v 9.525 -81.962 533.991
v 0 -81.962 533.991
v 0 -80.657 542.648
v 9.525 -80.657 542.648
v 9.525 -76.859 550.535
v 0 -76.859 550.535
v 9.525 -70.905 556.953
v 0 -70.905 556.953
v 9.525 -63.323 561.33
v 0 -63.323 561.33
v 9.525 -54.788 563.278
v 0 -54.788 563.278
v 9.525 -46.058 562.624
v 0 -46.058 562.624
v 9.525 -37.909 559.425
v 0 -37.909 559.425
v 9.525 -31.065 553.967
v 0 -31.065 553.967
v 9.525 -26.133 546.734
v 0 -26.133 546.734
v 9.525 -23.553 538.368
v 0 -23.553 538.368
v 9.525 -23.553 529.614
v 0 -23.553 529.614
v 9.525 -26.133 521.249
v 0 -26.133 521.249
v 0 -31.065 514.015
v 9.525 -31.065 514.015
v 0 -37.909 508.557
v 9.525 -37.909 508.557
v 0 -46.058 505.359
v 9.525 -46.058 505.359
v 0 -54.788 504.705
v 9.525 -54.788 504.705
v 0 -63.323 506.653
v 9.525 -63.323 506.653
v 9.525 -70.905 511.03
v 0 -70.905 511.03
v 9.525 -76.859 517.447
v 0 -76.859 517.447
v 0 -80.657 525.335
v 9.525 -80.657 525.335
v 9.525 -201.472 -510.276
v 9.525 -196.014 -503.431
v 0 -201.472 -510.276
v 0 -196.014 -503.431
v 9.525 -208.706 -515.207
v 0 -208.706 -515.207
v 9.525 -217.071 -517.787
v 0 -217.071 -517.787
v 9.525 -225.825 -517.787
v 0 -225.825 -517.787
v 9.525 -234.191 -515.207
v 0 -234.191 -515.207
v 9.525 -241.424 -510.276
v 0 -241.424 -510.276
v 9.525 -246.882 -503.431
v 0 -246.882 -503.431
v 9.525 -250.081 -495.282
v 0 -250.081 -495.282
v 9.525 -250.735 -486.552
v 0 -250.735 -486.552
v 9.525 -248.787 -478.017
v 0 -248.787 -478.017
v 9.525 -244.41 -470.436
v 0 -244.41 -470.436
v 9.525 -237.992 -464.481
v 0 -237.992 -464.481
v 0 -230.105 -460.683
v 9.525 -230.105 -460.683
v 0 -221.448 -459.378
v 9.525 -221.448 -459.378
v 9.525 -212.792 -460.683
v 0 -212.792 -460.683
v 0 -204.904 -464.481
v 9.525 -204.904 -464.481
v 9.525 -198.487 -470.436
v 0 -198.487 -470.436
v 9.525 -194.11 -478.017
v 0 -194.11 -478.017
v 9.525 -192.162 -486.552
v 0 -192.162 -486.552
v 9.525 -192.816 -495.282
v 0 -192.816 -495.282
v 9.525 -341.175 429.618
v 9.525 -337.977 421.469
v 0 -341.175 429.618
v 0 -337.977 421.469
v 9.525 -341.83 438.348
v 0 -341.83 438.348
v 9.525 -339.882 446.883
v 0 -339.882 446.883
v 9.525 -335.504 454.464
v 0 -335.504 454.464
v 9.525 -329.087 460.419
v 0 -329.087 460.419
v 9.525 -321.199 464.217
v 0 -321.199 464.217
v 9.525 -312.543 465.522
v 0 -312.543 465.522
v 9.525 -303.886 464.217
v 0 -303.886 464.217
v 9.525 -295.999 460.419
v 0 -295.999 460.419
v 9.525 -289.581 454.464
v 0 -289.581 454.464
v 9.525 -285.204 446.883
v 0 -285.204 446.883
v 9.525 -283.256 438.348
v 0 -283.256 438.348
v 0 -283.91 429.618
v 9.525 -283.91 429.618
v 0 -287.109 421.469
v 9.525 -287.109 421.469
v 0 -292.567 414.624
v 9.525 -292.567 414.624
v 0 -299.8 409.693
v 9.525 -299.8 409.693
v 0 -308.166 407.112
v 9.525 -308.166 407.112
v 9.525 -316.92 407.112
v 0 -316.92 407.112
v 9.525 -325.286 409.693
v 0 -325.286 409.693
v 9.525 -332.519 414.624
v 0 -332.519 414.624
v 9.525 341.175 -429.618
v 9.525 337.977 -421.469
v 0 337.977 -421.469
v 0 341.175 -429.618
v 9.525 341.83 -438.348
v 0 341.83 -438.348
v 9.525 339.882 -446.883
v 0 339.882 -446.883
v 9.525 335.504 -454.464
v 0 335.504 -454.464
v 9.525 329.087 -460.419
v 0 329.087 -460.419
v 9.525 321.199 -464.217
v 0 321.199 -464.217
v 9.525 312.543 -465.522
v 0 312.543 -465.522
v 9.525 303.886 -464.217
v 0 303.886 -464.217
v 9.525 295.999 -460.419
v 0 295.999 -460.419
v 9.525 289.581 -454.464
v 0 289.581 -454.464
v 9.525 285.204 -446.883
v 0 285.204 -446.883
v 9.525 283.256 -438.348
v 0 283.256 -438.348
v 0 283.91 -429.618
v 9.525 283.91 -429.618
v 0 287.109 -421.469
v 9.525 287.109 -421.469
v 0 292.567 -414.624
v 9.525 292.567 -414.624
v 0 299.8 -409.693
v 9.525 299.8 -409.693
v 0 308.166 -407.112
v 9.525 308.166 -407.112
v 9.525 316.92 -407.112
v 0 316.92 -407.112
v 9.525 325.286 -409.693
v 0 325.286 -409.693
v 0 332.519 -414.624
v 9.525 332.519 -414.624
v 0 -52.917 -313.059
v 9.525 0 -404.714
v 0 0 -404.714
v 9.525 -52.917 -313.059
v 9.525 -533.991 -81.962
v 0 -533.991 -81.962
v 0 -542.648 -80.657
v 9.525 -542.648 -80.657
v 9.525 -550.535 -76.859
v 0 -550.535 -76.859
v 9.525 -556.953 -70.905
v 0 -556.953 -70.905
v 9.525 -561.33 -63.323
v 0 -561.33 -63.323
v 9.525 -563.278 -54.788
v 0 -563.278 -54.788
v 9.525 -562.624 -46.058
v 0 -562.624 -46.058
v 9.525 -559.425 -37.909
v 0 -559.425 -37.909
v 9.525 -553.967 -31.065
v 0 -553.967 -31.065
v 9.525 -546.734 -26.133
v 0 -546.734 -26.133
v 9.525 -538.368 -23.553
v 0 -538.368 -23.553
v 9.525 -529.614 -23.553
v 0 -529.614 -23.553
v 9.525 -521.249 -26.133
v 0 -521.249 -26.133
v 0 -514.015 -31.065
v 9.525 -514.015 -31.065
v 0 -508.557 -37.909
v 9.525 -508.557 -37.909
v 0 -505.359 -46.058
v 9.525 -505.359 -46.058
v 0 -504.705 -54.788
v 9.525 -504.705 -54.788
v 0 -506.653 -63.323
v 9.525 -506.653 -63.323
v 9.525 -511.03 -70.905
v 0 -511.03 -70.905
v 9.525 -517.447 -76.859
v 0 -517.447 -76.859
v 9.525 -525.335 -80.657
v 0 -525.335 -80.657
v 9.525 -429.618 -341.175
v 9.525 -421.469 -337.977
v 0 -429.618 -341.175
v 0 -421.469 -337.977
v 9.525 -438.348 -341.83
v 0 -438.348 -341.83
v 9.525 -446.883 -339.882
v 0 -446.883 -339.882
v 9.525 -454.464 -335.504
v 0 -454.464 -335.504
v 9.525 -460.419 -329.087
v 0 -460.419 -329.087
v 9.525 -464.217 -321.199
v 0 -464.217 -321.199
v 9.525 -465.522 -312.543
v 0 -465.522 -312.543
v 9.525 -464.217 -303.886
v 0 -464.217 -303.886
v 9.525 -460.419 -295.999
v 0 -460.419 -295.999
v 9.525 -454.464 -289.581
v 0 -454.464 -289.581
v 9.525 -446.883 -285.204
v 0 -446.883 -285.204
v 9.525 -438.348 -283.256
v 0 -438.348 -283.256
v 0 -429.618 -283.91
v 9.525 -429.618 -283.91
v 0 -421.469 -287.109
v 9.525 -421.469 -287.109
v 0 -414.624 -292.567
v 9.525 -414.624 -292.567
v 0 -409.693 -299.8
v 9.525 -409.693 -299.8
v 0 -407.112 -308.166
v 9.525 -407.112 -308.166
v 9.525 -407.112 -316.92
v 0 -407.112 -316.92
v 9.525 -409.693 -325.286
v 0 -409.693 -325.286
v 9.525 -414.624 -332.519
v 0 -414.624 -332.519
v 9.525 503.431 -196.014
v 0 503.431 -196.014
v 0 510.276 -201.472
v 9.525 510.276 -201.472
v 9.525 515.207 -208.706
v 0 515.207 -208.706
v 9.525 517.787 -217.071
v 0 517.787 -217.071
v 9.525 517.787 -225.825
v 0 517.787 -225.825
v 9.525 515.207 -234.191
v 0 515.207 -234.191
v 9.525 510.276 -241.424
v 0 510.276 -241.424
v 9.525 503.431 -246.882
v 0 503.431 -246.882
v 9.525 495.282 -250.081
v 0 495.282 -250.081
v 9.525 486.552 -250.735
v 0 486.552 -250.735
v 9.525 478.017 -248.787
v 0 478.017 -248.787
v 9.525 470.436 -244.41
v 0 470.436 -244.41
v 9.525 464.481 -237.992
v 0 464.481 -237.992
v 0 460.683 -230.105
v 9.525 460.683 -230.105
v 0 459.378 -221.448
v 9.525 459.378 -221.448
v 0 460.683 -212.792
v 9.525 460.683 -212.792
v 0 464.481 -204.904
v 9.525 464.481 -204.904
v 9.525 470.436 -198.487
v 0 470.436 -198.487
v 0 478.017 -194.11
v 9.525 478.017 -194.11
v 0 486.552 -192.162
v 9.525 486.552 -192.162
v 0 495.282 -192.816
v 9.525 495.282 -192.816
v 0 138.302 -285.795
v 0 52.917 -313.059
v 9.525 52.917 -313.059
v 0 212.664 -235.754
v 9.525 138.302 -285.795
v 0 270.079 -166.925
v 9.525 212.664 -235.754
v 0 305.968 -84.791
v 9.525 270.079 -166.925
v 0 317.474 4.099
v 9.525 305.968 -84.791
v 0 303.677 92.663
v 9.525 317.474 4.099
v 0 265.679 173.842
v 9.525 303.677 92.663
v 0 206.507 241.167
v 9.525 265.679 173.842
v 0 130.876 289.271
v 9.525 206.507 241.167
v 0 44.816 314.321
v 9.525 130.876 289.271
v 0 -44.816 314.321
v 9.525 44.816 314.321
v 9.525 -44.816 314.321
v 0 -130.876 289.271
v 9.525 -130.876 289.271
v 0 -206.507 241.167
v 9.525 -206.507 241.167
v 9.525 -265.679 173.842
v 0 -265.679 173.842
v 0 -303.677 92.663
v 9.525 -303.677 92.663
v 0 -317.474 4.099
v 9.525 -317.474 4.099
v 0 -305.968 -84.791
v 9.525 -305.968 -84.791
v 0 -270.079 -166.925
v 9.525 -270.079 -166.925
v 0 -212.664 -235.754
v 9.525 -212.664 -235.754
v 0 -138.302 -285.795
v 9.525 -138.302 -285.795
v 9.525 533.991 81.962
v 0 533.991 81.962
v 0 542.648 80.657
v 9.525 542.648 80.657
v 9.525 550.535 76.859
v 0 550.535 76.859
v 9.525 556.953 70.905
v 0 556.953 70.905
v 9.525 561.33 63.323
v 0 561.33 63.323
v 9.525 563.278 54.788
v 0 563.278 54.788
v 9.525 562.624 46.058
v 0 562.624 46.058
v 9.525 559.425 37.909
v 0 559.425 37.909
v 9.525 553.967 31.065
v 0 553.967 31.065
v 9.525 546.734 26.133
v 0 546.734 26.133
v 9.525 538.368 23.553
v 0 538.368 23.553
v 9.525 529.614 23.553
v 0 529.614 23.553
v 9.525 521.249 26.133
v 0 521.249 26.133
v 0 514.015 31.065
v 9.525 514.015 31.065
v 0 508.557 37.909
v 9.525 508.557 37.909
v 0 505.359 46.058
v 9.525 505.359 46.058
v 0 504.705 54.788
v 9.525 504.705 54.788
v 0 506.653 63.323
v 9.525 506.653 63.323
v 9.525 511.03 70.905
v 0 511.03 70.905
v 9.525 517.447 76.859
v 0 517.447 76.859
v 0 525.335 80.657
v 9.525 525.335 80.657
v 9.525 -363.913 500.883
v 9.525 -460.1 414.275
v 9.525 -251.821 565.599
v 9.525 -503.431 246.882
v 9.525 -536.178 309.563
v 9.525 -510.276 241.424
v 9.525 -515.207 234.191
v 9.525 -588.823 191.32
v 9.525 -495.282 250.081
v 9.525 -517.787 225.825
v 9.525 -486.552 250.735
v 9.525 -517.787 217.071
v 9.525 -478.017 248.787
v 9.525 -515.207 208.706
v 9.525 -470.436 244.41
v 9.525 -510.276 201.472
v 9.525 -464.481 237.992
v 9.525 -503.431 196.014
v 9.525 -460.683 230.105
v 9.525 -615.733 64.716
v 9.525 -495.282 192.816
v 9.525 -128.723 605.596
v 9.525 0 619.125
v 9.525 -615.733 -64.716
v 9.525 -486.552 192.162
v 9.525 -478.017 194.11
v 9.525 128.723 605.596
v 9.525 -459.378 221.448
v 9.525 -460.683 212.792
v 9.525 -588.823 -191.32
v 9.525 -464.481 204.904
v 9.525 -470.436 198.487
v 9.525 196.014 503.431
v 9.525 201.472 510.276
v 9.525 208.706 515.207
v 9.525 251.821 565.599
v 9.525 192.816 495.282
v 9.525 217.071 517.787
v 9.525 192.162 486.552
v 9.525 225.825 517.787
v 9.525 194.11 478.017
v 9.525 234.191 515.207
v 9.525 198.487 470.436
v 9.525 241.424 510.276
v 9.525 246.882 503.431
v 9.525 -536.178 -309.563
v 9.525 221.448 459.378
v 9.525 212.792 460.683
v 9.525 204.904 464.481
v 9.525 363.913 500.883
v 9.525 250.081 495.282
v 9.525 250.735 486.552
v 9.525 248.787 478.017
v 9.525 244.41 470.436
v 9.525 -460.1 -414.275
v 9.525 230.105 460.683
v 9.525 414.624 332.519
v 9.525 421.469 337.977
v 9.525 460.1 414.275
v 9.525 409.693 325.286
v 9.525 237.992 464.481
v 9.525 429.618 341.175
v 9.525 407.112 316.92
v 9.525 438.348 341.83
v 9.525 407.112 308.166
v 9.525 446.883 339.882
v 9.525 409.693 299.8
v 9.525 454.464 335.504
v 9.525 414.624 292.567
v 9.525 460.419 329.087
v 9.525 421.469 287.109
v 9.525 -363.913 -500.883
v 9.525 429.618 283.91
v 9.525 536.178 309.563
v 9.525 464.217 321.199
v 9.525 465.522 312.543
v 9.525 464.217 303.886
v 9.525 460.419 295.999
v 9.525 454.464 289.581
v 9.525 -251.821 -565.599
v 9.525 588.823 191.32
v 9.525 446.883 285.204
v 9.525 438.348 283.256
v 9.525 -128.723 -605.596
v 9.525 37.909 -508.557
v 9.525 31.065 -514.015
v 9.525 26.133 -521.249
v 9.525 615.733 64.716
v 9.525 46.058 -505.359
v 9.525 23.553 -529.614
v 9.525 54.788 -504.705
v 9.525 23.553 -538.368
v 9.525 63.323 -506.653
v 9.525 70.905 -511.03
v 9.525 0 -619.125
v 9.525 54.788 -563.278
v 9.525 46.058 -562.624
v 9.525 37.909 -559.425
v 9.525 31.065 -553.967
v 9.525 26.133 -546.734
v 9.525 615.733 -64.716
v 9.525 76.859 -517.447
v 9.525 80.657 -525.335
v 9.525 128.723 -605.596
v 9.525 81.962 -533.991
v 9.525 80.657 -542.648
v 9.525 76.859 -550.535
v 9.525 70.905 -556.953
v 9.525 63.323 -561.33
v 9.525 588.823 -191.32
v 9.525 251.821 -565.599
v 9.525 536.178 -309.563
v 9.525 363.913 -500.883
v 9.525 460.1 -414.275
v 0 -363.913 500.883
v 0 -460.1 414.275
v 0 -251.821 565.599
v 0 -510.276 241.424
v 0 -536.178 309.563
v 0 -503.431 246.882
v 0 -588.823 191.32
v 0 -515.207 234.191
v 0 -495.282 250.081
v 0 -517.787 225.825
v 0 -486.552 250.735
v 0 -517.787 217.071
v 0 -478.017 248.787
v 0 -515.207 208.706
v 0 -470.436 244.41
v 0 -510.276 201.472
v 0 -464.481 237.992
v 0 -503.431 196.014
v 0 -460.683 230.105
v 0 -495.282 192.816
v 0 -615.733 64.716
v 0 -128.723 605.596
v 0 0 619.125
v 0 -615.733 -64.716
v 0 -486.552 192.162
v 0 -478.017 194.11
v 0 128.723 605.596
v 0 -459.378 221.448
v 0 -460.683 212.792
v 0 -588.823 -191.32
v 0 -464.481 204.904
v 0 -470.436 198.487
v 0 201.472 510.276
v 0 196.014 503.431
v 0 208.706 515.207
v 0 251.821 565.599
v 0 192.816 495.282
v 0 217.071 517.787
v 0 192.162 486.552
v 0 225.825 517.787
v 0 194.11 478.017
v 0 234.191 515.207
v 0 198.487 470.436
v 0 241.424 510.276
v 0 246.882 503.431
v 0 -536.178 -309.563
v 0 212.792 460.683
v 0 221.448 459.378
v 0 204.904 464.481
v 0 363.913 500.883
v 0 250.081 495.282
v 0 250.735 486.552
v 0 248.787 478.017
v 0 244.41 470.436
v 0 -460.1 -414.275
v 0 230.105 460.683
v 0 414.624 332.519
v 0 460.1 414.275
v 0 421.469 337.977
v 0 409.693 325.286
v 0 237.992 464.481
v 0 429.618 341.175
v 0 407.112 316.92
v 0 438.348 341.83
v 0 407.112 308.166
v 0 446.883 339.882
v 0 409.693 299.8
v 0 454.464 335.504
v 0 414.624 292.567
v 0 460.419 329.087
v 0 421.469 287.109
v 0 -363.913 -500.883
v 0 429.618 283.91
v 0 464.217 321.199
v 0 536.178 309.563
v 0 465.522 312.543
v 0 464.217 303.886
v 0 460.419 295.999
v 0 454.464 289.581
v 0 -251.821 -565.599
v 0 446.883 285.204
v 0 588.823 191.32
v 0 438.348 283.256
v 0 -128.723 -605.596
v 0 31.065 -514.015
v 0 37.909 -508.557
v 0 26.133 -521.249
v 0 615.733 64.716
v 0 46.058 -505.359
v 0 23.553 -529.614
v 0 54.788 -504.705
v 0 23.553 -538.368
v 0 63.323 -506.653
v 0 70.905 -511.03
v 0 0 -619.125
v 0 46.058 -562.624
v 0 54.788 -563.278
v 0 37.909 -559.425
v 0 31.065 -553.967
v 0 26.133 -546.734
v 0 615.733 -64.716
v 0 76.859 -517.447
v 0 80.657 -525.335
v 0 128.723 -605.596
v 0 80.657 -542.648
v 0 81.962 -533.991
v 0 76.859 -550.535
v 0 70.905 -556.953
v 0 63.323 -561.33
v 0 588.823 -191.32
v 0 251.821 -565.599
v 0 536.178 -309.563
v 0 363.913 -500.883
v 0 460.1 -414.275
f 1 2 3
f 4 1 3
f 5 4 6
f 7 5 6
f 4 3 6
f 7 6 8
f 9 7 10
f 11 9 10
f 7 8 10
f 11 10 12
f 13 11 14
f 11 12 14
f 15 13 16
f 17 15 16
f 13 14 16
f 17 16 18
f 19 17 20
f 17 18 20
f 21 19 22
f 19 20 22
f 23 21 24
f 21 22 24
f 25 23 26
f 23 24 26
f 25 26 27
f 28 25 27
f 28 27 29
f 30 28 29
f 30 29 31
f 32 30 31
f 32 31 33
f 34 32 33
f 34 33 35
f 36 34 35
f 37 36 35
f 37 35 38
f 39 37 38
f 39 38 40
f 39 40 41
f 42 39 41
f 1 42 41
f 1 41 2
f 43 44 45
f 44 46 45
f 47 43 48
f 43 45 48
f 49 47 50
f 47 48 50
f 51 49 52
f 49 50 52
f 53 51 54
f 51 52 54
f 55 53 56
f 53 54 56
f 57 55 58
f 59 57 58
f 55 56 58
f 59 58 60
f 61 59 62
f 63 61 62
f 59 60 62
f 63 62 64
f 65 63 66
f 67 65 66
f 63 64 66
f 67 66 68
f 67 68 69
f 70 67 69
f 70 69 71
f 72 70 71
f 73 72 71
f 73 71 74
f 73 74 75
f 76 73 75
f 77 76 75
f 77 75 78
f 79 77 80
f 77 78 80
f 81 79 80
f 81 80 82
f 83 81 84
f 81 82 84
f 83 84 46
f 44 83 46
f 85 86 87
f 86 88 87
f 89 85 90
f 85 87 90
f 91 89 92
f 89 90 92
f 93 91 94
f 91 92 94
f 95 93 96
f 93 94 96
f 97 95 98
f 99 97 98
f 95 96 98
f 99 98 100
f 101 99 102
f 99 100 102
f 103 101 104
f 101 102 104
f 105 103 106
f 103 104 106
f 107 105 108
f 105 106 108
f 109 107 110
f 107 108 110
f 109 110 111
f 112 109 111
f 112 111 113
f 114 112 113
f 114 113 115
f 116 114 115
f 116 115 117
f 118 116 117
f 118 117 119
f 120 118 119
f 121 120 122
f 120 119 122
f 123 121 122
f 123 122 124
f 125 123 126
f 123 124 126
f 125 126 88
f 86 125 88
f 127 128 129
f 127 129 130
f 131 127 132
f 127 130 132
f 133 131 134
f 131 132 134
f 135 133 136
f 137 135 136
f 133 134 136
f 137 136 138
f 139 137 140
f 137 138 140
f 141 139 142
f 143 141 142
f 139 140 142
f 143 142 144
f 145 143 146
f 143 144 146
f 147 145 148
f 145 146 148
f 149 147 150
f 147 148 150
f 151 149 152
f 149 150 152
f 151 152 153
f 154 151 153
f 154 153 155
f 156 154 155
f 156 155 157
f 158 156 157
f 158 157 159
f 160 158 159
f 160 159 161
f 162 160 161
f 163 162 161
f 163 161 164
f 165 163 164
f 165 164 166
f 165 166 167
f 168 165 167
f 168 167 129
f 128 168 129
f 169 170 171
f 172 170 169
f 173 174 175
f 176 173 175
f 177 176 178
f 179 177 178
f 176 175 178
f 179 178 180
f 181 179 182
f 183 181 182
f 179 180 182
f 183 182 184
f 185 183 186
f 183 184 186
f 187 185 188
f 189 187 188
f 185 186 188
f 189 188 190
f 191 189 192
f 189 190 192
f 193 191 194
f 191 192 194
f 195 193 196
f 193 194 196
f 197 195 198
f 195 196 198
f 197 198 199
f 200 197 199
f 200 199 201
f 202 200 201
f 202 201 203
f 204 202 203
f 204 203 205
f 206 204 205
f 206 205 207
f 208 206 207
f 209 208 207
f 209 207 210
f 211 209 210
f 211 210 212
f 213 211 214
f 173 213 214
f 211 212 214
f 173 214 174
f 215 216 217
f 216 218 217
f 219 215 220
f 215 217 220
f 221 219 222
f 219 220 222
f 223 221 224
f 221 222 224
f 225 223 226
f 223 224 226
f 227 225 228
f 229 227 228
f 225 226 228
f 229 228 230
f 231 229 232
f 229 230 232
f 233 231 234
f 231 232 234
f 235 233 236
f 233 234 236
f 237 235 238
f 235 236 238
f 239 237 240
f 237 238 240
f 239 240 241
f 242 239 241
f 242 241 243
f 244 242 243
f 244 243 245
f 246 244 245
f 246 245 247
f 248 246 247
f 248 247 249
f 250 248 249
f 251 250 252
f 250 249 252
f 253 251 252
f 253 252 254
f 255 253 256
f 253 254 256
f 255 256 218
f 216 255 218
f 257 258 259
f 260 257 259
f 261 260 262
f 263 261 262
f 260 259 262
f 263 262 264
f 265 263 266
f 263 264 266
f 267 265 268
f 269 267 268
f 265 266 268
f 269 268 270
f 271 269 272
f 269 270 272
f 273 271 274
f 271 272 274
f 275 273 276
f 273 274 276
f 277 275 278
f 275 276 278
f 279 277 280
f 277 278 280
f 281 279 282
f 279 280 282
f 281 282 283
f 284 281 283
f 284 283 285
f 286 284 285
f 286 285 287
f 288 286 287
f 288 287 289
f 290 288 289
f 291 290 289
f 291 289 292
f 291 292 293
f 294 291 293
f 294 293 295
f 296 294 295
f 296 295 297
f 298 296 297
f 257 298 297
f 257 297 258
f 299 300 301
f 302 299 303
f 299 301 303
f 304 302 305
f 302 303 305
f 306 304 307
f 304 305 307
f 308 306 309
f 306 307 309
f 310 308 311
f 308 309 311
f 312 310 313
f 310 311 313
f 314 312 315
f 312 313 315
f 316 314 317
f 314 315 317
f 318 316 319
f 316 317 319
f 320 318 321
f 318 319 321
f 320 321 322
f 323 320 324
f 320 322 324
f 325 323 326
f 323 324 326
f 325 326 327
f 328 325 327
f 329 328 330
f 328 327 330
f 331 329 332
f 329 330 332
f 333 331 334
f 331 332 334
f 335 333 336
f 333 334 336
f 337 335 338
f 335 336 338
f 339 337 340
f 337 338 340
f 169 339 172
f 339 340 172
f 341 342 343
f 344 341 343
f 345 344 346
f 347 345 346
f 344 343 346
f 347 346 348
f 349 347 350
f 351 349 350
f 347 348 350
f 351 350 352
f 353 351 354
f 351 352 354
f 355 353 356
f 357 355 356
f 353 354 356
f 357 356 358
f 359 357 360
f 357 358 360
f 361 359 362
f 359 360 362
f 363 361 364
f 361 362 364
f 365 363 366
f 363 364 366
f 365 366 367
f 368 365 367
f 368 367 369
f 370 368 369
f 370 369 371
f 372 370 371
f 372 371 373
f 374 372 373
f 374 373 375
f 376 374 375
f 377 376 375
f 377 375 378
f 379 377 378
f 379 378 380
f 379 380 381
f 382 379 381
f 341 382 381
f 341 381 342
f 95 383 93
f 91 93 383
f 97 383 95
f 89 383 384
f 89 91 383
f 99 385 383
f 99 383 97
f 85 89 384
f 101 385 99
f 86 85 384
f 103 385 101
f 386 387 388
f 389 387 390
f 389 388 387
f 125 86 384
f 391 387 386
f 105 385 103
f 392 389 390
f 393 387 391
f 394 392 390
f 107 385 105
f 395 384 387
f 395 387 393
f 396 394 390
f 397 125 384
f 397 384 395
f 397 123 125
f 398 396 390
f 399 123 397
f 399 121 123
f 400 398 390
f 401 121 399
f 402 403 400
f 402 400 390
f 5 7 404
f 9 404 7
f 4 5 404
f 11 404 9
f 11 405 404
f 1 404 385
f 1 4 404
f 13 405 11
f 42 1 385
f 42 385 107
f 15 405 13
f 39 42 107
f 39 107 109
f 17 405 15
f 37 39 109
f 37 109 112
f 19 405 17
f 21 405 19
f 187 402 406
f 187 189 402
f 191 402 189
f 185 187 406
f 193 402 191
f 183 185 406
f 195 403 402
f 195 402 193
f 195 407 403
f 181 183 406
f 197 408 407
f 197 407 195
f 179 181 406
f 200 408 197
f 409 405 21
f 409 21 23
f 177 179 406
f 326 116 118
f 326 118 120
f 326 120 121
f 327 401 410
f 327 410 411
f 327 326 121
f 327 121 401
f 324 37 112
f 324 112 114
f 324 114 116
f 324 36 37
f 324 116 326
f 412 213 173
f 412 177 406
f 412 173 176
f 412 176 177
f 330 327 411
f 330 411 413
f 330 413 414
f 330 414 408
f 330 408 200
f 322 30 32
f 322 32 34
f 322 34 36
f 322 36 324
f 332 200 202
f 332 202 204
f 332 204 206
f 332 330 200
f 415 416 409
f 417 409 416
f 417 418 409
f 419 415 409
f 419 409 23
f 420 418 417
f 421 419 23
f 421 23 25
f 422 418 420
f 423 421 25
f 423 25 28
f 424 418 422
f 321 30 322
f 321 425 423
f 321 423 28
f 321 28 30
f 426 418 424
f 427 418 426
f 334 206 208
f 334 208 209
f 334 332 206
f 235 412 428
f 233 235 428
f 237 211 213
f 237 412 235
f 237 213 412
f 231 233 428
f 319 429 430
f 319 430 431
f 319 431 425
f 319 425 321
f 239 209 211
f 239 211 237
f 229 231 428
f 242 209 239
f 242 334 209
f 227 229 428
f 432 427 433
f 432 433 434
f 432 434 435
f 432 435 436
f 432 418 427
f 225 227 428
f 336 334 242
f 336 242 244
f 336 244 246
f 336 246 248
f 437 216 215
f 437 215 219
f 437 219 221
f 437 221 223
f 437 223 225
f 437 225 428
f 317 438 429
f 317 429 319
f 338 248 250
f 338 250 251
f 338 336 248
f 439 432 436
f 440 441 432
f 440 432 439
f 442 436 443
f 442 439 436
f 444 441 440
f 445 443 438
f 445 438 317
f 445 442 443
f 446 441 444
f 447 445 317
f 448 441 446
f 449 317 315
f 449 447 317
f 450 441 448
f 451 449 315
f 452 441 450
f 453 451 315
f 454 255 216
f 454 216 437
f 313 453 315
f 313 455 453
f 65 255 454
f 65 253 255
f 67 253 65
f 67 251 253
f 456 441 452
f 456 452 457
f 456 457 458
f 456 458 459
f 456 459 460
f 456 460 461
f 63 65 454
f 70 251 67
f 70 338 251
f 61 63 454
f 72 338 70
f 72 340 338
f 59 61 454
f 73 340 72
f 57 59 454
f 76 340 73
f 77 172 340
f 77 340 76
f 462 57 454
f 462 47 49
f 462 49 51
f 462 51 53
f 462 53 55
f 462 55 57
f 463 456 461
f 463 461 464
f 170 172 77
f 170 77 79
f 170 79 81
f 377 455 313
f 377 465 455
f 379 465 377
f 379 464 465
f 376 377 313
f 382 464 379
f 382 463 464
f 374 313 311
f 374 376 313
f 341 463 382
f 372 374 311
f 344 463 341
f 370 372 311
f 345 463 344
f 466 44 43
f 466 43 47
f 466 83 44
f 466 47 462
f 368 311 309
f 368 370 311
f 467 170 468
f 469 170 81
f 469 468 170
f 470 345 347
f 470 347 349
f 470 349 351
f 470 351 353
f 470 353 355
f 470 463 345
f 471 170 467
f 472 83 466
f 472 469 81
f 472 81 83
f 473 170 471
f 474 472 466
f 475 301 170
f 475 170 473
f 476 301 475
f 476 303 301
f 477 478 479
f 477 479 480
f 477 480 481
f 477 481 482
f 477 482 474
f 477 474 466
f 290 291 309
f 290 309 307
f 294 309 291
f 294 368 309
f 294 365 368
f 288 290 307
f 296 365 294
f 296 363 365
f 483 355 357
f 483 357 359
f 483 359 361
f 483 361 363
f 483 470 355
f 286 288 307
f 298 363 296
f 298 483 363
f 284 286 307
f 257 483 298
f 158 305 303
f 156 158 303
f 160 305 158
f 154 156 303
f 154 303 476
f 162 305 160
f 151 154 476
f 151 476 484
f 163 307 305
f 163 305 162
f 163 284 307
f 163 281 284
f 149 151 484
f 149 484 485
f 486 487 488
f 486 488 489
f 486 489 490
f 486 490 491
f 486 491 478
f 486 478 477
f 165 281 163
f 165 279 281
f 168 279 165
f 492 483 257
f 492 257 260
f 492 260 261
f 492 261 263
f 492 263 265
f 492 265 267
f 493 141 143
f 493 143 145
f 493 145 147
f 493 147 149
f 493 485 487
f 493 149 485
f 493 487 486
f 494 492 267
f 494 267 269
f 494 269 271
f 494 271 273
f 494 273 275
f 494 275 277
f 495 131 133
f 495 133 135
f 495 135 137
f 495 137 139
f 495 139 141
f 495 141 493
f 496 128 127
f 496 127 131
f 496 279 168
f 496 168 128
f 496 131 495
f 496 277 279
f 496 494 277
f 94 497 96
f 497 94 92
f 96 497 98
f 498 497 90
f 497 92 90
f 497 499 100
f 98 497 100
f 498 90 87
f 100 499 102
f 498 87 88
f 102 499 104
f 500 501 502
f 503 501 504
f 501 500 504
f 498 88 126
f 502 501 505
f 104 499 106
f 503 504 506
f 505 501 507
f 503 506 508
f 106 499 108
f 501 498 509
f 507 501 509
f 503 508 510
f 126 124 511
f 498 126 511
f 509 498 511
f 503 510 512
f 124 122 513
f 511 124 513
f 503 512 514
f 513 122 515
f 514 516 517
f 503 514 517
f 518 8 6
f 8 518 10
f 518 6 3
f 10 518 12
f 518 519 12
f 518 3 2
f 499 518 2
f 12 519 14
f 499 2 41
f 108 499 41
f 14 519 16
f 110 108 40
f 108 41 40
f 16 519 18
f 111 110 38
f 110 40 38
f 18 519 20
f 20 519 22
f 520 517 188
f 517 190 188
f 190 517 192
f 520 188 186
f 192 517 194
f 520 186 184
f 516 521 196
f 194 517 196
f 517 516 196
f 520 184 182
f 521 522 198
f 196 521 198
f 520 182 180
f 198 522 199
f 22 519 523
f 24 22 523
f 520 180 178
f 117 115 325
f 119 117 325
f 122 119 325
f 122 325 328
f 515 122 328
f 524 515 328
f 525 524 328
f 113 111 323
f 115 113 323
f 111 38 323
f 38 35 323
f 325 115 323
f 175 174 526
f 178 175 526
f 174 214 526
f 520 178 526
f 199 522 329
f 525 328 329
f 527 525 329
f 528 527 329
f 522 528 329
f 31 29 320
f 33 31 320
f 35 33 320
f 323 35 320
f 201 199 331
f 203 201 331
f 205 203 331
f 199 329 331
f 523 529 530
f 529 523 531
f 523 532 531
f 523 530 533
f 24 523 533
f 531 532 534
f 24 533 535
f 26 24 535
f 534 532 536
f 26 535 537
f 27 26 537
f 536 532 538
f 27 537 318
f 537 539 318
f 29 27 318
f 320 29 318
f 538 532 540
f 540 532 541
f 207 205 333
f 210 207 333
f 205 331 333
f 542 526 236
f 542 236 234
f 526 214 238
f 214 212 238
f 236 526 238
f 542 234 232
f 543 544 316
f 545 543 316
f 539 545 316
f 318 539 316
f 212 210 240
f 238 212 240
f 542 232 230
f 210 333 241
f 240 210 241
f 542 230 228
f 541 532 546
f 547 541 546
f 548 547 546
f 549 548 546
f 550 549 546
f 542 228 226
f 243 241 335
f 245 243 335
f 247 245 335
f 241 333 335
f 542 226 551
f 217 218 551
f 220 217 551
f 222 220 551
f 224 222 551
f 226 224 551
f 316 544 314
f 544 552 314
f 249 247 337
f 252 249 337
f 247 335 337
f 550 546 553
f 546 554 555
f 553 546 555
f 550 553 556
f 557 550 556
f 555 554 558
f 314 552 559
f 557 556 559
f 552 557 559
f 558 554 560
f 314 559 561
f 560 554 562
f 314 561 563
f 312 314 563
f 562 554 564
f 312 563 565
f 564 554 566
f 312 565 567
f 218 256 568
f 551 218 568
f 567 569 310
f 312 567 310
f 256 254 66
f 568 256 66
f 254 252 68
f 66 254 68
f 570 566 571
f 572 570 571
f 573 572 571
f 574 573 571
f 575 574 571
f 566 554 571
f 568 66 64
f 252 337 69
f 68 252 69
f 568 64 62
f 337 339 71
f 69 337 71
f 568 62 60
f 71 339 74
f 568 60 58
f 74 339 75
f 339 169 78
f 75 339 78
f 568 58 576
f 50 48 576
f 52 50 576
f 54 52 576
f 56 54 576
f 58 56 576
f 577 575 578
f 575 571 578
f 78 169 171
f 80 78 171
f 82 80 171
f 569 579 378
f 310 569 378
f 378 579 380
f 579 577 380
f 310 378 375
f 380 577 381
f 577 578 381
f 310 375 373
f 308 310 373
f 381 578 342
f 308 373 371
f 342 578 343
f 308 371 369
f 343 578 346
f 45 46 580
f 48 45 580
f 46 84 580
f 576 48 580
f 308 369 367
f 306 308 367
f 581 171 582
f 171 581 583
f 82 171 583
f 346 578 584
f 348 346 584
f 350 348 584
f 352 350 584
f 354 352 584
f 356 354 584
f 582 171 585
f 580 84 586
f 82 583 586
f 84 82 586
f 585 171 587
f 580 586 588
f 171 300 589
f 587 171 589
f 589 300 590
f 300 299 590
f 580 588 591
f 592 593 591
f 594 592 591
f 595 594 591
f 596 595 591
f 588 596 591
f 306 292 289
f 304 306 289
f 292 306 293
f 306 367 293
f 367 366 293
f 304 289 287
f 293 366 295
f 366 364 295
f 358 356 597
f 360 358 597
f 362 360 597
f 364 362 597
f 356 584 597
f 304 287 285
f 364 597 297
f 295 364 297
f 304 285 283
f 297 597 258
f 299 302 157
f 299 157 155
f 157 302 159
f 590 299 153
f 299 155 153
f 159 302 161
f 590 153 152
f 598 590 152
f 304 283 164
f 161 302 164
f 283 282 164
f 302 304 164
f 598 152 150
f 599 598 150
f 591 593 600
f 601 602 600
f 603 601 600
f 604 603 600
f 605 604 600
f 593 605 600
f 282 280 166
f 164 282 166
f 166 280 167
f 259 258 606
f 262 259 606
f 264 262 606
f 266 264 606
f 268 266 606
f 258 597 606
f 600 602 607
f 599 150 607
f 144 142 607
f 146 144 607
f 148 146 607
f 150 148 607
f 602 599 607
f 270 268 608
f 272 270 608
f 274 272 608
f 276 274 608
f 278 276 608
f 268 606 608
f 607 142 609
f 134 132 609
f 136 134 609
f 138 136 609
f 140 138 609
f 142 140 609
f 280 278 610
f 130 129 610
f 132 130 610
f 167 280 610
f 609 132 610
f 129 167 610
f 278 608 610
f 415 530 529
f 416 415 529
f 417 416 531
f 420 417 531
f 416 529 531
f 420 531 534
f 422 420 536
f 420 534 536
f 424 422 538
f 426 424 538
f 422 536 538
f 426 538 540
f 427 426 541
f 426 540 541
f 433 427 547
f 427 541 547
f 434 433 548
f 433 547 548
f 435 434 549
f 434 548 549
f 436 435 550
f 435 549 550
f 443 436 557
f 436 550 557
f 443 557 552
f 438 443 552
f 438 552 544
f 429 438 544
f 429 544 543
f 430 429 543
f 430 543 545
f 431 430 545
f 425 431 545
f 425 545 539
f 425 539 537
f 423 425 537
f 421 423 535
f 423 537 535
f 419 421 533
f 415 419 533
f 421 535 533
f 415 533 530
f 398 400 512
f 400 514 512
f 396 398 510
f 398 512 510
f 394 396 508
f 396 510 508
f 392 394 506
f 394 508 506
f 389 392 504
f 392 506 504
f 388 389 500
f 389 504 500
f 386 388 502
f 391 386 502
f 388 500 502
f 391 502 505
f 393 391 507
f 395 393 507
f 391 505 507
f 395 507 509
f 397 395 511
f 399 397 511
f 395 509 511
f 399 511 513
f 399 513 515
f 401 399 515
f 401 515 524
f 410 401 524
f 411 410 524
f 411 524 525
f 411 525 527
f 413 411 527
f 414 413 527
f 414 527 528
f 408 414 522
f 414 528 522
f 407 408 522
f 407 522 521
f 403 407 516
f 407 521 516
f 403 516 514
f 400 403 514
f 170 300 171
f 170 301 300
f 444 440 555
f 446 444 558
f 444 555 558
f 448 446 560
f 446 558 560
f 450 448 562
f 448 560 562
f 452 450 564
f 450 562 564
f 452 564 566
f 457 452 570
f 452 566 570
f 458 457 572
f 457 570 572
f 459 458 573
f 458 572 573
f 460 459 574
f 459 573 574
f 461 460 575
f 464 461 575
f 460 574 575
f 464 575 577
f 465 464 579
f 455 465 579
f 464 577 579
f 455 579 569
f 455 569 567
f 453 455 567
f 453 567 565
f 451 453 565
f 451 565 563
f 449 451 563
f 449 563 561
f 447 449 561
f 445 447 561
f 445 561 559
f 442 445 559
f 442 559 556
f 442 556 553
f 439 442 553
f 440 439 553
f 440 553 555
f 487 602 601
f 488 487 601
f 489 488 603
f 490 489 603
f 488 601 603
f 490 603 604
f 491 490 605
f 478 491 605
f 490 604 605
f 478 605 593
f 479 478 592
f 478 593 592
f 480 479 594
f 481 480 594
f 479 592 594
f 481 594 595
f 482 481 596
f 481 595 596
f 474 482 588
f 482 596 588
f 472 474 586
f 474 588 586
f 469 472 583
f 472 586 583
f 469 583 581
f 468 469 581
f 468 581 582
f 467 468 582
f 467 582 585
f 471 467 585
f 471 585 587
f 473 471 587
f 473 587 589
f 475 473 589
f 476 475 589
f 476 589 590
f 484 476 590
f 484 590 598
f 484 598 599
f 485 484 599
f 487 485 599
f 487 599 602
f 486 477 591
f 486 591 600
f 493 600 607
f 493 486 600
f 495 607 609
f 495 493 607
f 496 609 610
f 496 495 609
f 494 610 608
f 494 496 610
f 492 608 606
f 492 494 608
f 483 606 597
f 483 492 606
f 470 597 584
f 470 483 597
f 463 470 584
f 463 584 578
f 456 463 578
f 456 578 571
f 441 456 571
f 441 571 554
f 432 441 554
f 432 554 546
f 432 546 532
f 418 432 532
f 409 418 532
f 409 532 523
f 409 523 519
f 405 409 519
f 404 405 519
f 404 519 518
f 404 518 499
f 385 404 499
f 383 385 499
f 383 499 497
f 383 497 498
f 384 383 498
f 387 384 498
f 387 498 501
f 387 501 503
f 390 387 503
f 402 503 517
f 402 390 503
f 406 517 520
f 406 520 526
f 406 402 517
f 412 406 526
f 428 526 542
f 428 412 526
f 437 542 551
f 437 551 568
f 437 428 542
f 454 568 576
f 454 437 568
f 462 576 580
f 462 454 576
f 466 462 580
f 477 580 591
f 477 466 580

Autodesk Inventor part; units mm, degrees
ref_plane "UCSBasePlConstraintOrigin: YZ Plane" through (0, 0, 0) normal (0, 0, -1) x (0, 1, 0)
ref_plane "UCSBasePlConstraintOrigin: XZ Plane" through (0, 0, 0) normal (0, 1, 0) x (1, 0, 0)
ref_plane "BASE_PLATE_FACE" through (9.525, 0, 0) normal (1, 0, 0) x (0, 1, 0)
sketch "BASE_PLATE_SKETCH" plane through (9.525, 0, 0) normal (1, 0, 0) x (0, 0, -1)
  circle A0 centre (0, 0) radius 536.575 construction
  circle A1 centre (0, 0) radius 317.5
  line L0 (0, 536.575) -> (0, 536.575) construction
  circle A2 centre (0, 0) radius 619.125
  line L1 (0, 0) -> (-52.5935, -533.9912) construction
  line L2 (0, 0) -> (52.5935, -533.9912) construction
  line L3 (313.0592, 52.9167) -> (404.7136, 0)
  line L4 (404.7136, 0) -> (313.0592, -52.9167)
  line L5 (313.0592, -52.9167) -> (313.0592, 52.9167)
  line L6 (0, 0) -> (0, 536.575) construction
  line L7 (0, 0) -> (267.5578, 465.1081) construction
  point P0 (-619.125, 0)
  point P1 (619.125, 0)
  point P2 (0, 619.125)
  point P3 (0, -619.125)
  point P4 (0, 619.125)
  point P5 (619.125, 0)
  point P6 (0, -619.125)
  point P7 (-619.125, 0)
  point P8 (343.6107, 0)
  point P9 (313.0592, 0)
  point P10 (313.0592, -52.9167)
  dimension "GapSize" = 9.525
  dimension "SeamGap" = 0.0051
  dimension "Thickness" = 9.525
  dimension "BendRadius" = 9.525
  dimension "MinimumRemnant" = 19.05
  dimension "BendReliefDepth" = 4.7625
  dimension "BendReliefWidth" = 9.525
  dimension "CornerReliefSize" = 38.1
  dimension "JacobiRadiusSize" = 9.525
  dimension "TransitionRadius" = 9.525
  dimension "TEMPLATE_CENTER_HOLE_DIA" = 635
  dimension "NUMBER_OF_HOLES_IN_BOLT_PLATE" = 12
  dimension "BOLT_CIRCLE_DIA" = 1073.15
  dimension "TEMPLATE_DIA" = 1238.25
  dimension "PARENT_HOLE_ANG_L" = 5.625
  dimension "PARENT_HOLE_ANG_R" = 5.625
  dimension "NOTCH_LEG" = 105.8333
  dimension "d297" = 105.8333
  dimension "LEADER_PLACE_A_ANG" = 29.91
extrude "BASE_PLATE_BODY" add sketch "BASE_PLATE_SKETCH" against normal up to surface (9.525 mm away) contours A1 L3 L4 | A2
ref_plane "SHAFT_MOUNTING_PLANE" through (9.525, 0, 0) normal (1, 0, 0) x (0, 1, 0)
hole "PARENT_HOLE" at (9.525, -533.9912, -52.5935) direction (-1, 0, 0) diameter 58.7375 depth 9.525 tip angle 118
pattern_circular "BOLT_HOLES" count 12 over 360 about axis through (-10, 0, 0) along (1, 0, 0) of "PARENT_HOLE"
ref_plane "DimPlaneRight" through (0, 0, -619.125) normal (0, 0, 1) x (1, 0, 0)
ref_plane "DimPlaneLeft" through (0, 0, 619.125) normal (0, 0, 1) x (1, 0, 0)
ref_plane "DimPlaneTop" through (0, 619.125, 0) normal (0, 1, 0) x (-1, 0, 0)
ref_plane "DimPlaneBtm" through (0, -619.125, 0) normal (0, 1, 0) x (-1, 0, 0)
ref_plane "PLPointBngPltCenterHoleDia" through (0, 0, 0) normal (0, -0.866, 0.5) x (1, 0, 0)
extrude "V NOTCH CUT" cut sketch "BASE_PLATE_SKETCH" against normal through all contours A1 L3 L4
equation "\"BOLT_CIRCLE_DIA\" = INPUT_BOLT_CIRCLE_DIAMETER"
equation "\"INPUT_TEMPLATE_DIAMETER\" = 1238.25"
equation "\"INPUT_BOLT_HOLE_SIZE\" = 58.7375"
equation "\"INPUT_BOLT_CIRCLE_DIAMETER\" = 1073.15"
equation "\"INPUT_PARENT_HOLE_ANG_OFF_90_270\" = 5.625deg"
equation "\"SHAFT_B_DIST_AK_BOTTOM\" = 933.5008"
equation "\"SHAFT_B_DIST_AF_BOTTOM\" = 901.7"
equation "\"SHAFT_B_Thickness\" = 7.9502"
equation "\"INPUT_CENTER_HOLE_DIAMETER\" = 635"
equation "\"LEADER_PLACE_A\" = 68.5deg"
equation "\"TEMPLATE_RAD\" = 619.125"
properties part number "25-00000E_TEMPLATE_TOP" material "A572 GRADE 65"
